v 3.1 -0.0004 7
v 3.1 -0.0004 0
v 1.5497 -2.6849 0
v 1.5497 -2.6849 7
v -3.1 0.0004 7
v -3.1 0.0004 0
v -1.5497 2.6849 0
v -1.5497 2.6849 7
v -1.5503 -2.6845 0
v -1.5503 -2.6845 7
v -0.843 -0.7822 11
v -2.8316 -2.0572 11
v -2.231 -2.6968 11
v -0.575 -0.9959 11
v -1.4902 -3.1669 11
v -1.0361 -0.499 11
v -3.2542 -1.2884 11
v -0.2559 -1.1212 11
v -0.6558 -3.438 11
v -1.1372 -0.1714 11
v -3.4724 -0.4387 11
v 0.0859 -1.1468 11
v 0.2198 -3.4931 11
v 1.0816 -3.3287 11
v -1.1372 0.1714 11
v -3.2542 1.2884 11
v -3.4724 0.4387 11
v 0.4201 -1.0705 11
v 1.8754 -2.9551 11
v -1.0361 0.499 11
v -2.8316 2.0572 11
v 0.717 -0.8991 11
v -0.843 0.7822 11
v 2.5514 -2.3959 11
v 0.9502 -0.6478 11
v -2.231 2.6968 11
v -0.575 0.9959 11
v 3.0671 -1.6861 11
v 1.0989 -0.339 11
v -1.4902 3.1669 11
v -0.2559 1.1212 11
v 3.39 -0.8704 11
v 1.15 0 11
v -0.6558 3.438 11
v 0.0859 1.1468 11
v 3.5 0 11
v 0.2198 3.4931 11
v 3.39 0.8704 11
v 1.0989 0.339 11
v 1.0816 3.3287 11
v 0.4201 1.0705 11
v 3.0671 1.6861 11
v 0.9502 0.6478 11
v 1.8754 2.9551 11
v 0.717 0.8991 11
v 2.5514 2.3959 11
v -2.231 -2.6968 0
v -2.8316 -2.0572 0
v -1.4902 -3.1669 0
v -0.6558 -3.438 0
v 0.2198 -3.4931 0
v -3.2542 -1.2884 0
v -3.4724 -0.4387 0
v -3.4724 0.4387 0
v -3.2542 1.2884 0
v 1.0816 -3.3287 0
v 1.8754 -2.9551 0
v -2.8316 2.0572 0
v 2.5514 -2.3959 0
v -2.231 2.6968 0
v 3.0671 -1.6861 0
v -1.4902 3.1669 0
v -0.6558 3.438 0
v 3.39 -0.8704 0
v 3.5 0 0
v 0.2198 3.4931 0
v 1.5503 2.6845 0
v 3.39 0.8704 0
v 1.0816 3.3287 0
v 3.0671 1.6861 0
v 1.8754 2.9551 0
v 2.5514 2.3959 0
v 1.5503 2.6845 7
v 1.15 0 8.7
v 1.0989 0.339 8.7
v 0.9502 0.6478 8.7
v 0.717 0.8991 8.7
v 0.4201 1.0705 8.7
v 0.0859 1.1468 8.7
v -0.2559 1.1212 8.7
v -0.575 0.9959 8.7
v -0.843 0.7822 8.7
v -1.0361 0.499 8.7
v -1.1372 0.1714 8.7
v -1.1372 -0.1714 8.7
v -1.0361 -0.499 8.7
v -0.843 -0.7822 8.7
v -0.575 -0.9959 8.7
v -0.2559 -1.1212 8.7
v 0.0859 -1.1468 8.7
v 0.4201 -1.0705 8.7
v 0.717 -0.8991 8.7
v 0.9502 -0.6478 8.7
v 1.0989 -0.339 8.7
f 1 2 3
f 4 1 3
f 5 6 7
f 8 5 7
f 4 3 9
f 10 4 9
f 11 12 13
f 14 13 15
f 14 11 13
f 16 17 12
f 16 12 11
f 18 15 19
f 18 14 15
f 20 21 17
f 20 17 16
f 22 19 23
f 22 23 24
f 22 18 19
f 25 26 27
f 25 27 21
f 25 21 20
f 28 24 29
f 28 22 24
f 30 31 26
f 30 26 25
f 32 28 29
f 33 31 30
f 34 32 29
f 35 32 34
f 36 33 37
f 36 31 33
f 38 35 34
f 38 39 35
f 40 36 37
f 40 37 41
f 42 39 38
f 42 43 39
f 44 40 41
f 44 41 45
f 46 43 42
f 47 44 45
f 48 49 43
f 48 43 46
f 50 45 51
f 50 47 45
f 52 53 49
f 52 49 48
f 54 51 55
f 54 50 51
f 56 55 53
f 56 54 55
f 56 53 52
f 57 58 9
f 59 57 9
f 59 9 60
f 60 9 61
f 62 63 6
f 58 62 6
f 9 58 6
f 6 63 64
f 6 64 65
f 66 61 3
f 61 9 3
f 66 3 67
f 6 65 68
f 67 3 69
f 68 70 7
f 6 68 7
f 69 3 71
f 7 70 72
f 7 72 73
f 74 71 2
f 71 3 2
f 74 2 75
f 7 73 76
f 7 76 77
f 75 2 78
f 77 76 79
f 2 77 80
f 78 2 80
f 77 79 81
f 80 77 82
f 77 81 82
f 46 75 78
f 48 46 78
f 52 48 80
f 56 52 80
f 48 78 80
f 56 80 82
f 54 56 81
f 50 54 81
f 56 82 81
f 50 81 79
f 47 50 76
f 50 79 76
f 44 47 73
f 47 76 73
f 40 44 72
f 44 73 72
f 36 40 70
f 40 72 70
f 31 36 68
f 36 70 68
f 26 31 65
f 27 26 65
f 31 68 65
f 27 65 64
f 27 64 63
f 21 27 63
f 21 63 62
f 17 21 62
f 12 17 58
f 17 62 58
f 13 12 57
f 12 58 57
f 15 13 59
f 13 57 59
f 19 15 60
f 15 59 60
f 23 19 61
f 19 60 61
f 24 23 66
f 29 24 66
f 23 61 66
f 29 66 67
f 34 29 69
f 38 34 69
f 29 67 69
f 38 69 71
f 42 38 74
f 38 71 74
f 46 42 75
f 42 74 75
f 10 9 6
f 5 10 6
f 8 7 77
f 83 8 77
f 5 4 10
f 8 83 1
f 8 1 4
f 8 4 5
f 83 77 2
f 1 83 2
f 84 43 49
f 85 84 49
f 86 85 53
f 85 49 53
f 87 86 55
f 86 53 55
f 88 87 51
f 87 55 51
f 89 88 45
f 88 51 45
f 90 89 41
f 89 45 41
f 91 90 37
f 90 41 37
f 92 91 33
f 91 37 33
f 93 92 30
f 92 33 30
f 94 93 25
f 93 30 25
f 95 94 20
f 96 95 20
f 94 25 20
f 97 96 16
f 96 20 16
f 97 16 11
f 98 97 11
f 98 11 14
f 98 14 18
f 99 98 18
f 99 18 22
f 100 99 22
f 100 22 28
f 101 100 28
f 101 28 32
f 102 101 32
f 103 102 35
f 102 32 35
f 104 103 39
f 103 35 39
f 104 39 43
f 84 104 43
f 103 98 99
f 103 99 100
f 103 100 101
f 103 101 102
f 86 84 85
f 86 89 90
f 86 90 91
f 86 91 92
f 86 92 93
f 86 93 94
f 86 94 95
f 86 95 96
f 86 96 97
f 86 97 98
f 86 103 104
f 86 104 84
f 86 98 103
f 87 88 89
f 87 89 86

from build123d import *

# Parameters (mm, degrees)
CROQUIS1_R              = 3.5
SALIENTE_EXTRUIR1_DEPTH = 11
CORTAR_EXTRUIR1_DEPTH   = 7
CROQUIS4_R              = 1.15
CORTAR_EXTRUIR2_DEPTH   = 2.3


with BuildPart() as part:
    # Croquis1 → Saliente-Extruir1 (new body)
    with BuildSketch(Plane.XY):
        Circle(CROQUIS1_R)
    extrude(amount=SALIENTE_EXTRUIR1_DEPTH)

    # Croquis3 → Cortar-Extruir1 (cut)
    with BuildSketch(Plane(origin=(0, 0, 0), x_dir=(-1, 0, 0), z_dir=(0, 0, -1))):
        Polygon((1.549659556, 2.684875278), (-1.550340419, 2.684482182), (-3.099999975, -0.000393096), (-1.549659556, -2.684875278), (1.550340419, -2.684482182), (3.099999975, 0.000393096), align=None)
    extrude(amount=-CORTAR_EXTRUIR1_DEPTH, mode=Mode.SUBTRACT)

    # Croquis4 → Cortar-Extruir2 (cut)
    with BuildSketch(Plane.XY.offset(11)):
        Circle(CROQUIS4_R)
    extrude(amount=-CORTAR_EXTRUIR2_DEPTH, mode=Mode.SUBTRACT)


solid = part.part
